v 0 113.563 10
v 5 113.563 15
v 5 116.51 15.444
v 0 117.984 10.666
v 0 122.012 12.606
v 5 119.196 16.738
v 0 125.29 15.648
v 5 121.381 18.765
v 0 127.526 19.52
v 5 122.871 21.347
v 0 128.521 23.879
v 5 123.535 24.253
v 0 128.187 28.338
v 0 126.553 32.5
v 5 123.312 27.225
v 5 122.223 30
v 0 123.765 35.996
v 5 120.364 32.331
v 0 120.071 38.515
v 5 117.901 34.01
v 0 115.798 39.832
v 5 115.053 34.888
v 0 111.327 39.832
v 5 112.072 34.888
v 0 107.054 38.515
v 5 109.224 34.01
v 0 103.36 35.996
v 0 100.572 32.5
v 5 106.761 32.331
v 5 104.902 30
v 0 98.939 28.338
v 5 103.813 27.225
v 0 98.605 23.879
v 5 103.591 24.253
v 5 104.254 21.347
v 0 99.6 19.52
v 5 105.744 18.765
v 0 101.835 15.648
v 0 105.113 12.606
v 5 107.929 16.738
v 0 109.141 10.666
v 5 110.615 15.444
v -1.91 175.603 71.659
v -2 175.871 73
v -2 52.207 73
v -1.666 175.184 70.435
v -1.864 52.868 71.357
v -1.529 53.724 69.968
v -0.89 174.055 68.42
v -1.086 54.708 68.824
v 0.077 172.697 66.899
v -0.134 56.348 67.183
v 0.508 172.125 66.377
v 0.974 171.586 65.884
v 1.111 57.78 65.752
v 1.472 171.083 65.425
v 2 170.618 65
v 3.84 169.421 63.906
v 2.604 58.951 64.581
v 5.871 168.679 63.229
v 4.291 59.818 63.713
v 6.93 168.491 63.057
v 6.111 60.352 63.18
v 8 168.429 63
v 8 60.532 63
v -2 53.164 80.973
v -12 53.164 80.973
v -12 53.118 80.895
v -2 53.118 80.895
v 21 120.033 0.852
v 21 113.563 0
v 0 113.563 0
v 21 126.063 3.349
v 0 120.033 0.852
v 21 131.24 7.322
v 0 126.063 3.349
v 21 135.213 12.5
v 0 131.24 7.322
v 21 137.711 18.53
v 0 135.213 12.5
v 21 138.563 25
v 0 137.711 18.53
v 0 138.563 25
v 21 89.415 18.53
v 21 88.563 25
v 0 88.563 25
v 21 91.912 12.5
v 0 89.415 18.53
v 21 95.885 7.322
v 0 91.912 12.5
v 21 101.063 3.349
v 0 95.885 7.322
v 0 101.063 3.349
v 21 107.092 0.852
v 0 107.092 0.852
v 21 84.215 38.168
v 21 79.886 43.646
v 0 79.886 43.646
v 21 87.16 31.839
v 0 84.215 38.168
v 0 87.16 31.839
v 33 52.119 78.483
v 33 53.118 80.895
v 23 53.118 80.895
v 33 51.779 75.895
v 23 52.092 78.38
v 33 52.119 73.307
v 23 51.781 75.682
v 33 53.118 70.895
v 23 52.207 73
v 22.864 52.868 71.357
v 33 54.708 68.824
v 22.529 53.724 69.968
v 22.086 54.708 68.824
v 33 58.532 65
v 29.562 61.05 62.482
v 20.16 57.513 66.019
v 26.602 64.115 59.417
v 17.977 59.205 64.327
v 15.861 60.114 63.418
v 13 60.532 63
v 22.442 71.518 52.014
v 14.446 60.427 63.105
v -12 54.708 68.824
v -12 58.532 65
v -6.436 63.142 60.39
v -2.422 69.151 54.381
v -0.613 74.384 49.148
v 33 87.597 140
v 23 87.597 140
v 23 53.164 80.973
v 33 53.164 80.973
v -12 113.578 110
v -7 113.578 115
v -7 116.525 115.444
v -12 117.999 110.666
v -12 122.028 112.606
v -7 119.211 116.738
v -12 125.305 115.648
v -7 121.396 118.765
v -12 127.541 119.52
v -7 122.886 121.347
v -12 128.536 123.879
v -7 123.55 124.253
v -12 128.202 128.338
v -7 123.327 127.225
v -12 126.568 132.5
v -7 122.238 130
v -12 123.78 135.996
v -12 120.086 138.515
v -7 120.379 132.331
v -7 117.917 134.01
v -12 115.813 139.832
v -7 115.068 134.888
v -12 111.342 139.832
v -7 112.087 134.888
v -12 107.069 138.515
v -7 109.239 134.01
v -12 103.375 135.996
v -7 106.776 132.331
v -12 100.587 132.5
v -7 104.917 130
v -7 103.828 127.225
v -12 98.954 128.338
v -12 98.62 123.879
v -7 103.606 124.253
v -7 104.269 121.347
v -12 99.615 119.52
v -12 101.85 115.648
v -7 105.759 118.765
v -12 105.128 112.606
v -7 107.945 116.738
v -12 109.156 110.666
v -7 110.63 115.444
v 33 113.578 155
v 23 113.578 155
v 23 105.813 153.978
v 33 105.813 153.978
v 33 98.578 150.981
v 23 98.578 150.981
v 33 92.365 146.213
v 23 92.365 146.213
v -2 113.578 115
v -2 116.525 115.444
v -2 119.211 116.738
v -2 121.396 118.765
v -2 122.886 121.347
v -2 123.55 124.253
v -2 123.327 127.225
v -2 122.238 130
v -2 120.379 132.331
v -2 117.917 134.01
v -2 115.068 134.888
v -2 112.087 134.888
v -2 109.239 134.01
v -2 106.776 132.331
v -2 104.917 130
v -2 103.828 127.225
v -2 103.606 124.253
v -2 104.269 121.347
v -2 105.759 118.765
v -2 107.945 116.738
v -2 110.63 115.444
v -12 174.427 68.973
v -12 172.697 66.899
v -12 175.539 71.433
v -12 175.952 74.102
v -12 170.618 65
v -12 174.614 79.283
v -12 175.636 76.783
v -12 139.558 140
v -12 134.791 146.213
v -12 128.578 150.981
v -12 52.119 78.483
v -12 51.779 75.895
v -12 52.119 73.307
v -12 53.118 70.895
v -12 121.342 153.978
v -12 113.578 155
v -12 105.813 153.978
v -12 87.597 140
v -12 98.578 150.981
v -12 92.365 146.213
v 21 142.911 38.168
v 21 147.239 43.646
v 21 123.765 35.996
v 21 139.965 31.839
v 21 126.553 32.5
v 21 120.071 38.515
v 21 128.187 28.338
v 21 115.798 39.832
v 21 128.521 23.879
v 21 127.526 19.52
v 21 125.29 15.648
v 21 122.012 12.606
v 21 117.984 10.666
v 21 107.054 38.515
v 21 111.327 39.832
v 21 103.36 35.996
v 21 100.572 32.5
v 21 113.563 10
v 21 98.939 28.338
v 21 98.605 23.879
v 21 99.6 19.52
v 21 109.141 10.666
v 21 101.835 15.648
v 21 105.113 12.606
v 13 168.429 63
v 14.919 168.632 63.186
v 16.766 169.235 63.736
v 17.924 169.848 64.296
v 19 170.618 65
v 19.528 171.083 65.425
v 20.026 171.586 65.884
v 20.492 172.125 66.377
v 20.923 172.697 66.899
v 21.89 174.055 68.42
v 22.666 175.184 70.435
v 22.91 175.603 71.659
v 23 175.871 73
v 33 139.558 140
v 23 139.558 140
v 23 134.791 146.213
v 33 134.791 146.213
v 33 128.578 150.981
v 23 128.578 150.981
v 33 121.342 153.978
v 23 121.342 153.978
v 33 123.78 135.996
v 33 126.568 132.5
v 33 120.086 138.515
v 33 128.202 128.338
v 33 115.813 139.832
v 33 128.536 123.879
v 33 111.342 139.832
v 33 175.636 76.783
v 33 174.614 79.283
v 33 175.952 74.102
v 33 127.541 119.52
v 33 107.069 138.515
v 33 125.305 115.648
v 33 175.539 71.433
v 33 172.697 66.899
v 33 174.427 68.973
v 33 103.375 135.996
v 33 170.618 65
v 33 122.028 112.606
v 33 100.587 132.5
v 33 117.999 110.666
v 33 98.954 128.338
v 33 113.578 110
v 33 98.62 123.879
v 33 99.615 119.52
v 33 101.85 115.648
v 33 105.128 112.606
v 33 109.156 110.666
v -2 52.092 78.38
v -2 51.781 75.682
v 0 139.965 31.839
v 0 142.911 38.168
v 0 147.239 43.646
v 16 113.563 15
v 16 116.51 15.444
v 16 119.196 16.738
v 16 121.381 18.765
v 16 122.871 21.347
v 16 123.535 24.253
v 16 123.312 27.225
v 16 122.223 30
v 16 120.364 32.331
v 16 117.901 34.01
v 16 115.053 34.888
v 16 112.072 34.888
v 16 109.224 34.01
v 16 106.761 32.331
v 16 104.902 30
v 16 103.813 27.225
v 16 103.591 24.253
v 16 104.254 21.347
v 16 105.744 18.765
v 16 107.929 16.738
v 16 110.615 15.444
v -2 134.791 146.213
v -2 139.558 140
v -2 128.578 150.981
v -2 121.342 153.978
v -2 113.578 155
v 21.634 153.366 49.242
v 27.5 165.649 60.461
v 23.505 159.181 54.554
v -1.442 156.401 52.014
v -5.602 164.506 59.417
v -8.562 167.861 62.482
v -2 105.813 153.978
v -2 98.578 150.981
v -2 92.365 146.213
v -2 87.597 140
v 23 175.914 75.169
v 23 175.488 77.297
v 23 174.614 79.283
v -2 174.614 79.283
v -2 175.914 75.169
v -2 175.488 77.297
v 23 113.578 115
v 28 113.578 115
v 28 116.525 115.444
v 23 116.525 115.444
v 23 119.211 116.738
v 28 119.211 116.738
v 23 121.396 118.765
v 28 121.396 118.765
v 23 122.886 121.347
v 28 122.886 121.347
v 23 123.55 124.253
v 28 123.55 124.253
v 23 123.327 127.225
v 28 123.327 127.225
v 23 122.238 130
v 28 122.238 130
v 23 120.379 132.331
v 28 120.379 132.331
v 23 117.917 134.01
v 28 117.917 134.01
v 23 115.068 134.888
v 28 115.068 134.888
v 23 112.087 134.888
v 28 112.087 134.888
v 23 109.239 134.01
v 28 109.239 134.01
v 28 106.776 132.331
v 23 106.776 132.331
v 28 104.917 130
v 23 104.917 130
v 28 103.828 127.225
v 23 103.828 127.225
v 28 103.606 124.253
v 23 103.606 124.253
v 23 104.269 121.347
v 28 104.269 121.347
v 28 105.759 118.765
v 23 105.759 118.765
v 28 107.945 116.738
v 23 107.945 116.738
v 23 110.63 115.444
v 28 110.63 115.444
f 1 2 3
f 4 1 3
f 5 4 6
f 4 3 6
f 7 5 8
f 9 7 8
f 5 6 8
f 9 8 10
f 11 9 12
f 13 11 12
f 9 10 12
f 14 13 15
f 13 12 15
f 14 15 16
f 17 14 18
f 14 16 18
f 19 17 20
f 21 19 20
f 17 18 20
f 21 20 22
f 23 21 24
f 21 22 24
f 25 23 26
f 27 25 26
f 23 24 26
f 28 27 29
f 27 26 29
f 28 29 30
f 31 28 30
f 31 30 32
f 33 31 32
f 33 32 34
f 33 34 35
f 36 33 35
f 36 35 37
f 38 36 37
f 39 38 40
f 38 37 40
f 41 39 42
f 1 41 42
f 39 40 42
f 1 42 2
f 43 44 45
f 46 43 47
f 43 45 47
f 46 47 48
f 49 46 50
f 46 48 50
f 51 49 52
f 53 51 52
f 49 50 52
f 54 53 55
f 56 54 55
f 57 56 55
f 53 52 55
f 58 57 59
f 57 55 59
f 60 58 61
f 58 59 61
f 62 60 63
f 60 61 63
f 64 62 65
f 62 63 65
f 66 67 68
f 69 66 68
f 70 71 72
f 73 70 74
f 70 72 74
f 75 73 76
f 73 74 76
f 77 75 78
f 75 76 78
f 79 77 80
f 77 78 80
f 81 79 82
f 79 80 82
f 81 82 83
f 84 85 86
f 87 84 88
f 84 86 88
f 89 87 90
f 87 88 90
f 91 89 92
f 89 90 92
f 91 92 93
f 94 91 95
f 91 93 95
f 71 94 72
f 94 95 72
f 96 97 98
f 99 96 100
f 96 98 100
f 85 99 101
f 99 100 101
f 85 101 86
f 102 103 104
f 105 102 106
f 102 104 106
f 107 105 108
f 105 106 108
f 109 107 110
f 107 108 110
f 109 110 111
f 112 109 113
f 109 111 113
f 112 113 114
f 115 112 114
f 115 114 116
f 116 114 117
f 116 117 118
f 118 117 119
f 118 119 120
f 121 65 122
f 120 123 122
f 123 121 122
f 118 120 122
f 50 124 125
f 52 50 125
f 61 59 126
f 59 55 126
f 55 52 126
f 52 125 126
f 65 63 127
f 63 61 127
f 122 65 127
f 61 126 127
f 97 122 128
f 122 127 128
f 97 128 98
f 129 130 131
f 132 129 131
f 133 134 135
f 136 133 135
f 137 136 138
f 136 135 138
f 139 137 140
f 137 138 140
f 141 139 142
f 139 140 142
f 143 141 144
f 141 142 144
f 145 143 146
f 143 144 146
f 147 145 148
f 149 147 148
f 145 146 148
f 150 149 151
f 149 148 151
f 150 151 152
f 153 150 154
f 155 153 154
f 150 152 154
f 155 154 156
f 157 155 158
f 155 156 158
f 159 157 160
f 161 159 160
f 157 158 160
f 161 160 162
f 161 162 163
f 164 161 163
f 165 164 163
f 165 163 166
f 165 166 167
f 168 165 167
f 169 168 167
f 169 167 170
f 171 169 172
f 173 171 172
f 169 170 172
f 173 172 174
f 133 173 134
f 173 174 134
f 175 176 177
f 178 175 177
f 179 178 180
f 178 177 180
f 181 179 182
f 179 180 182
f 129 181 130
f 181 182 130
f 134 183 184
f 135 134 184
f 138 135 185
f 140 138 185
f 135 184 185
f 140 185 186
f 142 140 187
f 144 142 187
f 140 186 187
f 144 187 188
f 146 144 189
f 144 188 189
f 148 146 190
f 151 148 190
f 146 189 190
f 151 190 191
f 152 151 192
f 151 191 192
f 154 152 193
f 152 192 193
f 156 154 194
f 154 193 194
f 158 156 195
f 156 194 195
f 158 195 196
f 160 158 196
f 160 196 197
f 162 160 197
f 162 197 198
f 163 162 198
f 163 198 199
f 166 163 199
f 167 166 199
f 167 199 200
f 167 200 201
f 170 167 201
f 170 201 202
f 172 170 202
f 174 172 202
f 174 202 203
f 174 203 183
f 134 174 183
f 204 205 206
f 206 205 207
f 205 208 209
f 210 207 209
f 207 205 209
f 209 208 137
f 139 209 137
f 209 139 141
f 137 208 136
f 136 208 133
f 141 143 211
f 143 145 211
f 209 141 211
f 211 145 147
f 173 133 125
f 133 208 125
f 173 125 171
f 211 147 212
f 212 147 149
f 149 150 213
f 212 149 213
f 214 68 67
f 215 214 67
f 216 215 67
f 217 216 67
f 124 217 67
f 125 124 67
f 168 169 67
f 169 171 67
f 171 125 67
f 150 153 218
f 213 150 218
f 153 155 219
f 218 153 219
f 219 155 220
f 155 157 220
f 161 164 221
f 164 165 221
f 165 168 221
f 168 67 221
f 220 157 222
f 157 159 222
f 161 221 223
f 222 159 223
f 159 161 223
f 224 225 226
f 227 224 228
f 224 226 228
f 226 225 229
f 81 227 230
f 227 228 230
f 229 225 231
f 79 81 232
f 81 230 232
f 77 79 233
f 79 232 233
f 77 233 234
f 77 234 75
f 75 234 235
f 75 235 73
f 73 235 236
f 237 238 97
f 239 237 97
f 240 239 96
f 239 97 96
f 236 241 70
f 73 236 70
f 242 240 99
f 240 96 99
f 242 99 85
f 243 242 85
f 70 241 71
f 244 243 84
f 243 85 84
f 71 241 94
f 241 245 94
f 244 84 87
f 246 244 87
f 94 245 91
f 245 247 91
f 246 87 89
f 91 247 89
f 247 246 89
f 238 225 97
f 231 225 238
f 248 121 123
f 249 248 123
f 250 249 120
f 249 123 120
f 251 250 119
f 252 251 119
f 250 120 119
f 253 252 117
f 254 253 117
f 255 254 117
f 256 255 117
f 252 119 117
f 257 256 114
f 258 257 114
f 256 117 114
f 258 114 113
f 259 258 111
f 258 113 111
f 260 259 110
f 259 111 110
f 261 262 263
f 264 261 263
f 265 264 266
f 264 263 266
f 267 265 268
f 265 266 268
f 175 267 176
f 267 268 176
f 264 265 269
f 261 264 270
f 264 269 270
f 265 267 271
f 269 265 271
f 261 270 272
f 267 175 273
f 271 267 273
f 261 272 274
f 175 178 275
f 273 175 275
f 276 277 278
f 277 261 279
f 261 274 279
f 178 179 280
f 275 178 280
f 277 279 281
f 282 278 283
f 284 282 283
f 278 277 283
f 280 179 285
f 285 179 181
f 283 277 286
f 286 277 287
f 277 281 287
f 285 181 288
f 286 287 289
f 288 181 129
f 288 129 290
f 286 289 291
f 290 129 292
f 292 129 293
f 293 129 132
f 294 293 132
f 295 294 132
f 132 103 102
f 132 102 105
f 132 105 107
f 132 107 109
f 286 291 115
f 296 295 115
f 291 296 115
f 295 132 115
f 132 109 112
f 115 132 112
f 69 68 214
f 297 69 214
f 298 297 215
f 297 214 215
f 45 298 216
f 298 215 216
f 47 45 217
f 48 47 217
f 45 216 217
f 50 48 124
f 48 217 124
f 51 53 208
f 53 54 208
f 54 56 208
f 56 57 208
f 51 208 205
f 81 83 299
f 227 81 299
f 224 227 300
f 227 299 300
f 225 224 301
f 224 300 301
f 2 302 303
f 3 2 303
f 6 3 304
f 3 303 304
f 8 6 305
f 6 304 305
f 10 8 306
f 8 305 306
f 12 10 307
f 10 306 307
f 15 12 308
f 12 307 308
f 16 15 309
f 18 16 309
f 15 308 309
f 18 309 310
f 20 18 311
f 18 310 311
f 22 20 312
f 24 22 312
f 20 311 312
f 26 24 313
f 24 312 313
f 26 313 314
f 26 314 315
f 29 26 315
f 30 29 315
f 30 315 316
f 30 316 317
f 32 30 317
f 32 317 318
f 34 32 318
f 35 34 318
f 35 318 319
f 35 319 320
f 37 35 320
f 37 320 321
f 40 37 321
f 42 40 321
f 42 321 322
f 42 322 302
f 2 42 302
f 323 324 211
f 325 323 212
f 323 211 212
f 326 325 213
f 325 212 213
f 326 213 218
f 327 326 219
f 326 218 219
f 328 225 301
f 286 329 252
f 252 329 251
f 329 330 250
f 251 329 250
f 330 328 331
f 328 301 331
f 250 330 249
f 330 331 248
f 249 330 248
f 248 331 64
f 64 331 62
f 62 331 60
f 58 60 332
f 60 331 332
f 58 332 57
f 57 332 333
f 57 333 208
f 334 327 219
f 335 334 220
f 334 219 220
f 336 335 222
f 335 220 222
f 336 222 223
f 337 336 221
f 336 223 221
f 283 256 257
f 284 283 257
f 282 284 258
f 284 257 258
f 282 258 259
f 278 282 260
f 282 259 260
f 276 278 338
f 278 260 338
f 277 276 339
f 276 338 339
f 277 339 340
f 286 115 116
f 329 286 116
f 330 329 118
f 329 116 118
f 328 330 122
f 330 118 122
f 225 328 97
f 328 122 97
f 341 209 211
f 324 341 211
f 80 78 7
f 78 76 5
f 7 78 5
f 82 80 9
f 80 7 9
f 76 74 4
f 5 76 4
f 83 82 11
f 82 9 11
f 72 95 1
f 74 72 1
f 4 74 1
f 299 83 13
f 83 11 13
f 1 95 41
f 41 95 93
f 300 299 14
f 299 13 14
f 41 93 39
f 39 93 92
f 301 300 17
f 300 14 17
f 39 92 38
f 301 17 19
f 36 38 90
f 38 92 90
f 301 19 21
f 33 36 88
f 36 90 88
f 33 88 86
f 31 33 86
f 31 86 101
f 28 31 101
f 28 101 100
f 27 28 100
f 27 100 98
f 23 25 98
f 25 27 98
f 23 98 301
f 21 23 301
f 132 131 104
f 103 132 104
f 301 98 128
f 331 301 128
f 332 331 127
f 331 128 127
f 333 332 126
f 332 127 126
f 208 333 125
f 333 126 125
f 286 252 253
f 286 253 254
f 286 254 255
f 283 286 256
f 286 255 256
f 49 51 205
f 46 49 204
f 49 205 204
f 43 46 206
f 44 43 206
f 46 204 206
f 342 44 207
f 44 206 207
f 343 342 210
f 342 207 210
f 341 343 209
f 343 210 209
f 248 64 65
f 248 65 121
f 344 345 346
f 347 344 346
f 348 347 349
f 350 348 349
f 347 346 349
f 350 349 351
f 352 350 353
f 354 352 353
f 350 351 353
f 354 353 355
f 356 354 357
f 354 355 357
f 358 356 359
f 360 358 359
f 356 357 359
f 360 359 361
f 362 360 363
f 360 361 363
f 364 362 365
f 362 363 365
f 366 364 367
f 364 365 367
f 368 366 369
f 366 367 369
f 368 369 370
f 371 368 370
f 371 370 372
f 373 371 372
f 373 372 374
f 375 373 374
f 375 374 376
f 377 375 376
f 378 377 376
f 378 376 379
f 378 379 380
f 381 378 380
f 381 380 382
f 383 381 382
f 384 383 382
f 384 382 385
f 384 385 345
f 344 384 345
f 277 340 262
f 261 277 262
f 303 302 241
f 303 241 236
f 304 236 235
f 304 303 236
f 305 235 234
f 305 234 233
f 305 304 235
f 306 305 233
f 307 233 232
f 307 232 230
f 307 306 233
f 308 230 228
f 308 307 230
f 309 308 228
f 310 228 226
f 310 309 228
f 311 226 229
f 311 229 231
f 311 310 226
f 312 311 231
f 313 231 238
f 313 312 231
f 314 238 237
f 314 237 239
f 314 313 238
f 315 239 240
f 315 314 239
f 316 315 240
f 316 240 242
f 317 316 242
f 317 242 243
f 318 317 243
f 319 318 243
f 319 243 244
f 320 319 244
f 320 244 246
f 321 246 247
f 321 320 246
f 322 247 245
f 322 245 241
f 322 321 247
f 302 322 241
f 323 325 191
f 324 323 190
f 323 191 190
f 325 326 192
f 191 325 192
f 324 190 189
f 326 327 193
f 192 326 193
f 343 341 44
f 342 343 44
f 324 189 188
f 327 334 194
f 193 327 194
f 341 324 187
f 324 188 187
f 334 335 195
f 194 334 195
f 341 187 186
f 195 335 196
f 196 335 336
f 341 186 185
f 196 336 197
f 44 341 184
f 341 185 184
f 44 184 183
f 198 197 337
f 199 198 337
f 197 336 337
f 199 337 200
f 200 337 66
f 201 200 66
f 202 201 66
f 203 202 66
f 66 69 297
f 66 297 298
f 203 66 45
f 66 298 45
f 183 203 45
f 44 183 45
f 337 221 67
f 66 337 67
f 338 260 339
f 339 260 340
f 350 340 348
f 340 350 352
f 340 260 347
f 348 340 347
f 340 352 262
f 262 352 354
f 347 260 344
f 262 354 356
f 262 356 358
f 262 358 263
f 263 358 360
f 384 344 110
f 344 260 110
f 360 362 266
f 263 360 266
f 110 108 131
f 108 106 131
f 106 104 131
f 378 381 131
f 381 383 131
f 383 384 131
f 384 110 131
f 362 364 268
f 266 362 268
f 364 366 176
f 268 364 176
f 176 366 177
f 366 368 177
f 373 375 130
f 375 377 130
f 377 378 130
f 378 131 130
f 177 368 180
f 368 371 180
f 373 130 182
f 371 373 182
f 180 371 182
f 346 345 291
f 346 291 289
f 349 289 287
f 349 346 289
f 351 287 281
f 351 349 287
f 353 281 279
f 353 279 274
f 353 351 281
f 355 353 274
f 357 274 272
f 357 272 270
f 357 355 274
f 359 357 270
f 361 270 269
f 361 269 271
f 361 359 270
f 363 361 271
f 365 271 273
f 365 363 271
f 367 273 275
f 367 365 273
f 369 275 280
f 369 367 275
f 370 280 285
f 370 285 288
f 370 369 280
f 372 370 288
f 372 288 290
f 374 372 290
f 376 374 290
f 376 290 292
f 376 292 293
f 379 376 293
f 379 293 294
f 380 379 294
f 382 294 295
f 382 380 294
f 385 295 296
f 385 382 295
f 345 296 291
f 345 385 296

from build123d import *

# Parameters (mm, degrees)
BOSS_EXTRUDE1_DEPTH = 218
CUT_EXTRUDE1_DEPTH  = 218
CUT_EXTRUDE2_DEPTH  = 218
SKETCH6_R           = 10
CUT_EXTRUDE3_DEPTH  = 218
SKETCH7_R           = 10
CUT_EXTRUDE4_DEPTH  = 218
CHAMFER1_SIZE       = 5


with BuildPart() as part:
    # Sketch1 → Boss-Extrude1 (new body)
    with BuildSketch(Plane(origin=(0, 0, 0), x_dir=(1, 0, 0), z_dir=(0, 1, 0))):
        with BuildLine():
            Line((8, -63), (13, -63))
            ThreePointArc((13, -63), (20.071067812, -65.928932188), (23, -73))
            Line((23, -73), (23, -155))
            Line((23, -155), (33, -155))
            Line((33, -155), (33, -65))
            ThreePointArc((33, -65), (24.205505282, -55.89329221), (21, -43.645843496))
            Line((21, -43.645843496), (21, 0))
            Line((21, 0), (0, 0))
            Line((0, 0), (0, -43.645843496))
            ThreePointArc((0, -43.645843496), (-3.205505282, -55.89329221), (-12, -65))
            Line((-12, -65), (-12, -155))
            Line((-12, -155), (-2, -155))
            Line((-2, -155), (-2, -100.45062745))
            Line((-2, -100.45062745), (-2, -73))
            ThreePointArc((-2, -73), (0.928932188, -65.928932188), (8, -63))
        make_face()
    extrude(amount=BOSS_EXTRUDE1_DEPTH)

    # Sketch3 → Cut-Extrude1 (cut)
    with BuildSketch(Plane.ZY):
        with BuildLine():
            ThreePointArc((25, 138.56265757), (35.089663756, 141.253339953), (43.645843496, 147.239396639))
            Line((43.645843496, 147.239396639), (43.645843496, 218))
            Line((43.645843496, 218), (0, 218))
            Line((0, 218), (0, 113.56265757))
            ThreePointArc((0, 113.56265757), (7.32233047, 131.2403271), (25, 138.56265757))
        make_face()
        with BuildLine():
            ThreePointArc((25, 88.56265757), (7.32233047, 95.884988041), (0, 113.56265757))
            Line((0, 113.56265757), (0, 0))
            Line((0, 0), (43.645843496, 0))
            Line((43.645843496, 0), (43.645843496, 79.885918501))
            ThreePointArc((43.645843496, 79.885918501), (35.089663756, 85.871975187), (25, 88.56265757))
        make_face()
    extrude(amount=-CUT_EXTRUDE1_DEPTH, mode=Mode.SUBTRACT)

    # Sketch5 → Cut-Extrude2 (cut)
    with BuildSketch(Plane.ZY.offset(12)):
        with BuildLine():
            ThreePointArc((66.899192484, 172.697482901), (72.753620331, 175.835761562), (79.282746191, 174.613618416))
            Line((79.282746191, 174.613618416), (140, 139.558495585))
            ThreePointArc((140, 139.558495585), (150.980762114, 128.577733471), (155, 113.577733471))
            Line((155, 113.577733471), (155, 218))
            Line((155, 218), (65, 218))
            Line((65, 218), (65, 170.618220852))
            Line((65, 170.618220852), (66.899192484, 172.697482901))
        make_face()
        Polygon((43.645843496, 147.239396639), (65, 170.618220852), (65, 218), (43.645843496, 218), align=None)
        Polygon((65, 0), (65, 58.531761997), (43.645843496, 79.885918501), (43.645843496, 0), align=None)
        with BuildLine():
            Line((155, 0), (155, 113.577733471))
            ThreePointArc((155, 113.577733471), (150.980762114, 98.577733471), (140, 87.596971358))
            Line((140, 87.596971358), (80.972769589, 53.163585587))
            Line((80.972769589, 53.163585587), (80.895268222, 53.11837536))
            ThreePointArc((80.895268222, 53.11837536), (74.5900063, 51.864180784), (68.824200411, 54.707561586))
            Line((68.824200411, 54.707561586), (65, 58.531761997))
            Line((65, 58.531761997), (65, 0))
            Line((65, 0), (155, 0))
        make_face()
    extrude(amount=-CUT_EXTRUDE2_DEPTH, mode=Mode.SUBTRACT)

    # Sketch6 → Cut-Extrude3 (cut)
    with BuildSketch(Plane(origin=(33, 0, 0), x_dir=(0, 0, -1), z_dir=(1, 0, 0))):
        with Locations((-125, 113.577733471)):
            Circle(SKETCH6_R)
    extrude(amount=-CUT_EXTRUDE3_DEPTH, mode=Mode.SUBTRACT)

    # Sketch7 → Cut-Extrude4 (cut)
    with BuildSketch(Plane(origin=(21, 0, 0), x_dir=(0, 0, -1), z_dir=(1, 0, 0))):
        with Locations((-25, 113.56265757)):
            Circle(SKETCH7_R)
    extrude(amount=-CUT_EXTRUDE4_DEPTH, mode=Mode.SUBTRACT)

    # Chamfer1
    chamfer1_edges = [part.edges().sort_by_distance(p)[0] for p in [
        (-12, 113.577733471, 135),
        (33, 113.577733471, 135),
        (0, 113.56265757, 35),
        (21, 113.56265757, 35),
    ]]
    chamfer(chamfer1_edges, length=CHAMFER1_SIZE)


solid = part.part
